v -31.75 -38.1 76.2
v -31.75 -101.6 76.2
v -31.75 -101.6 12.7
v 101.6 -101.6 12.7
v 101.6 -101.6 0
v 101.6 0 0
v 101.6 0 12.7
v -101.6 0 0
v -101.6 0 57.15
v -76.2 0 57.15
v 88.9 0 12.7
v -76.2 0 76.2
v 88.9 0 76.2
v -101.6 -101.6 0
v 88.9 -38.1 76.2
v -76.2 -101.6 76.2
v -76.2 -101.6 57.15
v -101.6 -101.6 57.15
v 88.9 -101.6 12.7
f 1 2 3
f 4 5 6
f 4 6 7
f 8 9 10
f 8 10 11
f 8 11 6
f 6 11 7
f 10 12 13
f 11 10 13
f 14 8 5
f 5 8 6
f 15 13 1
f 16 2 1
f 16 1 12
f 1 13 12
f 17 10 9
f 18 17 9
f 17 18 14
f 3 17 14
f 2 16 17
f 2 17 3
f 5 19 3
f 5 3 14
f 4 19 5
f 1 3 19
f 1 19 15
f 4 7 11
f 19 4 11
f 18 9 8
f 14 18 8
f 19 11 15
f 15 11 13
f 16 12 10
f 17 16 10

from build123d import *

# Parameters (mm, degrees)
F1_DEPTH = 101.6
F3_DEPTH = 120.65


with BuildPart() as f1:
    # F0 (on Front) → F1 (new body)
    with BuildSketch(Plane.XZ):
        Polygon((-101.6, 0), (0, 0), (101.6, 0), (101.6, 12.7), (88.9, 12.7), (88.9, 76.2), (-76.2, 76.2), (-76.2, 57.15), (-101.6, 57.15), align=None)
    extrude(amount=F1_DEPTH)

    # F2 (on face) → F3 (cut)
    with BuildSketch(Plane.YZ.offset(88.9)):
        Polygon((-101.6, 76.2), (-101.6, 12.7), (-38.1, 76.2), align=None)
    extrude(amount=-F3_DEPTH, mode=Mode.SUBTRACT)


solid = f1.part
